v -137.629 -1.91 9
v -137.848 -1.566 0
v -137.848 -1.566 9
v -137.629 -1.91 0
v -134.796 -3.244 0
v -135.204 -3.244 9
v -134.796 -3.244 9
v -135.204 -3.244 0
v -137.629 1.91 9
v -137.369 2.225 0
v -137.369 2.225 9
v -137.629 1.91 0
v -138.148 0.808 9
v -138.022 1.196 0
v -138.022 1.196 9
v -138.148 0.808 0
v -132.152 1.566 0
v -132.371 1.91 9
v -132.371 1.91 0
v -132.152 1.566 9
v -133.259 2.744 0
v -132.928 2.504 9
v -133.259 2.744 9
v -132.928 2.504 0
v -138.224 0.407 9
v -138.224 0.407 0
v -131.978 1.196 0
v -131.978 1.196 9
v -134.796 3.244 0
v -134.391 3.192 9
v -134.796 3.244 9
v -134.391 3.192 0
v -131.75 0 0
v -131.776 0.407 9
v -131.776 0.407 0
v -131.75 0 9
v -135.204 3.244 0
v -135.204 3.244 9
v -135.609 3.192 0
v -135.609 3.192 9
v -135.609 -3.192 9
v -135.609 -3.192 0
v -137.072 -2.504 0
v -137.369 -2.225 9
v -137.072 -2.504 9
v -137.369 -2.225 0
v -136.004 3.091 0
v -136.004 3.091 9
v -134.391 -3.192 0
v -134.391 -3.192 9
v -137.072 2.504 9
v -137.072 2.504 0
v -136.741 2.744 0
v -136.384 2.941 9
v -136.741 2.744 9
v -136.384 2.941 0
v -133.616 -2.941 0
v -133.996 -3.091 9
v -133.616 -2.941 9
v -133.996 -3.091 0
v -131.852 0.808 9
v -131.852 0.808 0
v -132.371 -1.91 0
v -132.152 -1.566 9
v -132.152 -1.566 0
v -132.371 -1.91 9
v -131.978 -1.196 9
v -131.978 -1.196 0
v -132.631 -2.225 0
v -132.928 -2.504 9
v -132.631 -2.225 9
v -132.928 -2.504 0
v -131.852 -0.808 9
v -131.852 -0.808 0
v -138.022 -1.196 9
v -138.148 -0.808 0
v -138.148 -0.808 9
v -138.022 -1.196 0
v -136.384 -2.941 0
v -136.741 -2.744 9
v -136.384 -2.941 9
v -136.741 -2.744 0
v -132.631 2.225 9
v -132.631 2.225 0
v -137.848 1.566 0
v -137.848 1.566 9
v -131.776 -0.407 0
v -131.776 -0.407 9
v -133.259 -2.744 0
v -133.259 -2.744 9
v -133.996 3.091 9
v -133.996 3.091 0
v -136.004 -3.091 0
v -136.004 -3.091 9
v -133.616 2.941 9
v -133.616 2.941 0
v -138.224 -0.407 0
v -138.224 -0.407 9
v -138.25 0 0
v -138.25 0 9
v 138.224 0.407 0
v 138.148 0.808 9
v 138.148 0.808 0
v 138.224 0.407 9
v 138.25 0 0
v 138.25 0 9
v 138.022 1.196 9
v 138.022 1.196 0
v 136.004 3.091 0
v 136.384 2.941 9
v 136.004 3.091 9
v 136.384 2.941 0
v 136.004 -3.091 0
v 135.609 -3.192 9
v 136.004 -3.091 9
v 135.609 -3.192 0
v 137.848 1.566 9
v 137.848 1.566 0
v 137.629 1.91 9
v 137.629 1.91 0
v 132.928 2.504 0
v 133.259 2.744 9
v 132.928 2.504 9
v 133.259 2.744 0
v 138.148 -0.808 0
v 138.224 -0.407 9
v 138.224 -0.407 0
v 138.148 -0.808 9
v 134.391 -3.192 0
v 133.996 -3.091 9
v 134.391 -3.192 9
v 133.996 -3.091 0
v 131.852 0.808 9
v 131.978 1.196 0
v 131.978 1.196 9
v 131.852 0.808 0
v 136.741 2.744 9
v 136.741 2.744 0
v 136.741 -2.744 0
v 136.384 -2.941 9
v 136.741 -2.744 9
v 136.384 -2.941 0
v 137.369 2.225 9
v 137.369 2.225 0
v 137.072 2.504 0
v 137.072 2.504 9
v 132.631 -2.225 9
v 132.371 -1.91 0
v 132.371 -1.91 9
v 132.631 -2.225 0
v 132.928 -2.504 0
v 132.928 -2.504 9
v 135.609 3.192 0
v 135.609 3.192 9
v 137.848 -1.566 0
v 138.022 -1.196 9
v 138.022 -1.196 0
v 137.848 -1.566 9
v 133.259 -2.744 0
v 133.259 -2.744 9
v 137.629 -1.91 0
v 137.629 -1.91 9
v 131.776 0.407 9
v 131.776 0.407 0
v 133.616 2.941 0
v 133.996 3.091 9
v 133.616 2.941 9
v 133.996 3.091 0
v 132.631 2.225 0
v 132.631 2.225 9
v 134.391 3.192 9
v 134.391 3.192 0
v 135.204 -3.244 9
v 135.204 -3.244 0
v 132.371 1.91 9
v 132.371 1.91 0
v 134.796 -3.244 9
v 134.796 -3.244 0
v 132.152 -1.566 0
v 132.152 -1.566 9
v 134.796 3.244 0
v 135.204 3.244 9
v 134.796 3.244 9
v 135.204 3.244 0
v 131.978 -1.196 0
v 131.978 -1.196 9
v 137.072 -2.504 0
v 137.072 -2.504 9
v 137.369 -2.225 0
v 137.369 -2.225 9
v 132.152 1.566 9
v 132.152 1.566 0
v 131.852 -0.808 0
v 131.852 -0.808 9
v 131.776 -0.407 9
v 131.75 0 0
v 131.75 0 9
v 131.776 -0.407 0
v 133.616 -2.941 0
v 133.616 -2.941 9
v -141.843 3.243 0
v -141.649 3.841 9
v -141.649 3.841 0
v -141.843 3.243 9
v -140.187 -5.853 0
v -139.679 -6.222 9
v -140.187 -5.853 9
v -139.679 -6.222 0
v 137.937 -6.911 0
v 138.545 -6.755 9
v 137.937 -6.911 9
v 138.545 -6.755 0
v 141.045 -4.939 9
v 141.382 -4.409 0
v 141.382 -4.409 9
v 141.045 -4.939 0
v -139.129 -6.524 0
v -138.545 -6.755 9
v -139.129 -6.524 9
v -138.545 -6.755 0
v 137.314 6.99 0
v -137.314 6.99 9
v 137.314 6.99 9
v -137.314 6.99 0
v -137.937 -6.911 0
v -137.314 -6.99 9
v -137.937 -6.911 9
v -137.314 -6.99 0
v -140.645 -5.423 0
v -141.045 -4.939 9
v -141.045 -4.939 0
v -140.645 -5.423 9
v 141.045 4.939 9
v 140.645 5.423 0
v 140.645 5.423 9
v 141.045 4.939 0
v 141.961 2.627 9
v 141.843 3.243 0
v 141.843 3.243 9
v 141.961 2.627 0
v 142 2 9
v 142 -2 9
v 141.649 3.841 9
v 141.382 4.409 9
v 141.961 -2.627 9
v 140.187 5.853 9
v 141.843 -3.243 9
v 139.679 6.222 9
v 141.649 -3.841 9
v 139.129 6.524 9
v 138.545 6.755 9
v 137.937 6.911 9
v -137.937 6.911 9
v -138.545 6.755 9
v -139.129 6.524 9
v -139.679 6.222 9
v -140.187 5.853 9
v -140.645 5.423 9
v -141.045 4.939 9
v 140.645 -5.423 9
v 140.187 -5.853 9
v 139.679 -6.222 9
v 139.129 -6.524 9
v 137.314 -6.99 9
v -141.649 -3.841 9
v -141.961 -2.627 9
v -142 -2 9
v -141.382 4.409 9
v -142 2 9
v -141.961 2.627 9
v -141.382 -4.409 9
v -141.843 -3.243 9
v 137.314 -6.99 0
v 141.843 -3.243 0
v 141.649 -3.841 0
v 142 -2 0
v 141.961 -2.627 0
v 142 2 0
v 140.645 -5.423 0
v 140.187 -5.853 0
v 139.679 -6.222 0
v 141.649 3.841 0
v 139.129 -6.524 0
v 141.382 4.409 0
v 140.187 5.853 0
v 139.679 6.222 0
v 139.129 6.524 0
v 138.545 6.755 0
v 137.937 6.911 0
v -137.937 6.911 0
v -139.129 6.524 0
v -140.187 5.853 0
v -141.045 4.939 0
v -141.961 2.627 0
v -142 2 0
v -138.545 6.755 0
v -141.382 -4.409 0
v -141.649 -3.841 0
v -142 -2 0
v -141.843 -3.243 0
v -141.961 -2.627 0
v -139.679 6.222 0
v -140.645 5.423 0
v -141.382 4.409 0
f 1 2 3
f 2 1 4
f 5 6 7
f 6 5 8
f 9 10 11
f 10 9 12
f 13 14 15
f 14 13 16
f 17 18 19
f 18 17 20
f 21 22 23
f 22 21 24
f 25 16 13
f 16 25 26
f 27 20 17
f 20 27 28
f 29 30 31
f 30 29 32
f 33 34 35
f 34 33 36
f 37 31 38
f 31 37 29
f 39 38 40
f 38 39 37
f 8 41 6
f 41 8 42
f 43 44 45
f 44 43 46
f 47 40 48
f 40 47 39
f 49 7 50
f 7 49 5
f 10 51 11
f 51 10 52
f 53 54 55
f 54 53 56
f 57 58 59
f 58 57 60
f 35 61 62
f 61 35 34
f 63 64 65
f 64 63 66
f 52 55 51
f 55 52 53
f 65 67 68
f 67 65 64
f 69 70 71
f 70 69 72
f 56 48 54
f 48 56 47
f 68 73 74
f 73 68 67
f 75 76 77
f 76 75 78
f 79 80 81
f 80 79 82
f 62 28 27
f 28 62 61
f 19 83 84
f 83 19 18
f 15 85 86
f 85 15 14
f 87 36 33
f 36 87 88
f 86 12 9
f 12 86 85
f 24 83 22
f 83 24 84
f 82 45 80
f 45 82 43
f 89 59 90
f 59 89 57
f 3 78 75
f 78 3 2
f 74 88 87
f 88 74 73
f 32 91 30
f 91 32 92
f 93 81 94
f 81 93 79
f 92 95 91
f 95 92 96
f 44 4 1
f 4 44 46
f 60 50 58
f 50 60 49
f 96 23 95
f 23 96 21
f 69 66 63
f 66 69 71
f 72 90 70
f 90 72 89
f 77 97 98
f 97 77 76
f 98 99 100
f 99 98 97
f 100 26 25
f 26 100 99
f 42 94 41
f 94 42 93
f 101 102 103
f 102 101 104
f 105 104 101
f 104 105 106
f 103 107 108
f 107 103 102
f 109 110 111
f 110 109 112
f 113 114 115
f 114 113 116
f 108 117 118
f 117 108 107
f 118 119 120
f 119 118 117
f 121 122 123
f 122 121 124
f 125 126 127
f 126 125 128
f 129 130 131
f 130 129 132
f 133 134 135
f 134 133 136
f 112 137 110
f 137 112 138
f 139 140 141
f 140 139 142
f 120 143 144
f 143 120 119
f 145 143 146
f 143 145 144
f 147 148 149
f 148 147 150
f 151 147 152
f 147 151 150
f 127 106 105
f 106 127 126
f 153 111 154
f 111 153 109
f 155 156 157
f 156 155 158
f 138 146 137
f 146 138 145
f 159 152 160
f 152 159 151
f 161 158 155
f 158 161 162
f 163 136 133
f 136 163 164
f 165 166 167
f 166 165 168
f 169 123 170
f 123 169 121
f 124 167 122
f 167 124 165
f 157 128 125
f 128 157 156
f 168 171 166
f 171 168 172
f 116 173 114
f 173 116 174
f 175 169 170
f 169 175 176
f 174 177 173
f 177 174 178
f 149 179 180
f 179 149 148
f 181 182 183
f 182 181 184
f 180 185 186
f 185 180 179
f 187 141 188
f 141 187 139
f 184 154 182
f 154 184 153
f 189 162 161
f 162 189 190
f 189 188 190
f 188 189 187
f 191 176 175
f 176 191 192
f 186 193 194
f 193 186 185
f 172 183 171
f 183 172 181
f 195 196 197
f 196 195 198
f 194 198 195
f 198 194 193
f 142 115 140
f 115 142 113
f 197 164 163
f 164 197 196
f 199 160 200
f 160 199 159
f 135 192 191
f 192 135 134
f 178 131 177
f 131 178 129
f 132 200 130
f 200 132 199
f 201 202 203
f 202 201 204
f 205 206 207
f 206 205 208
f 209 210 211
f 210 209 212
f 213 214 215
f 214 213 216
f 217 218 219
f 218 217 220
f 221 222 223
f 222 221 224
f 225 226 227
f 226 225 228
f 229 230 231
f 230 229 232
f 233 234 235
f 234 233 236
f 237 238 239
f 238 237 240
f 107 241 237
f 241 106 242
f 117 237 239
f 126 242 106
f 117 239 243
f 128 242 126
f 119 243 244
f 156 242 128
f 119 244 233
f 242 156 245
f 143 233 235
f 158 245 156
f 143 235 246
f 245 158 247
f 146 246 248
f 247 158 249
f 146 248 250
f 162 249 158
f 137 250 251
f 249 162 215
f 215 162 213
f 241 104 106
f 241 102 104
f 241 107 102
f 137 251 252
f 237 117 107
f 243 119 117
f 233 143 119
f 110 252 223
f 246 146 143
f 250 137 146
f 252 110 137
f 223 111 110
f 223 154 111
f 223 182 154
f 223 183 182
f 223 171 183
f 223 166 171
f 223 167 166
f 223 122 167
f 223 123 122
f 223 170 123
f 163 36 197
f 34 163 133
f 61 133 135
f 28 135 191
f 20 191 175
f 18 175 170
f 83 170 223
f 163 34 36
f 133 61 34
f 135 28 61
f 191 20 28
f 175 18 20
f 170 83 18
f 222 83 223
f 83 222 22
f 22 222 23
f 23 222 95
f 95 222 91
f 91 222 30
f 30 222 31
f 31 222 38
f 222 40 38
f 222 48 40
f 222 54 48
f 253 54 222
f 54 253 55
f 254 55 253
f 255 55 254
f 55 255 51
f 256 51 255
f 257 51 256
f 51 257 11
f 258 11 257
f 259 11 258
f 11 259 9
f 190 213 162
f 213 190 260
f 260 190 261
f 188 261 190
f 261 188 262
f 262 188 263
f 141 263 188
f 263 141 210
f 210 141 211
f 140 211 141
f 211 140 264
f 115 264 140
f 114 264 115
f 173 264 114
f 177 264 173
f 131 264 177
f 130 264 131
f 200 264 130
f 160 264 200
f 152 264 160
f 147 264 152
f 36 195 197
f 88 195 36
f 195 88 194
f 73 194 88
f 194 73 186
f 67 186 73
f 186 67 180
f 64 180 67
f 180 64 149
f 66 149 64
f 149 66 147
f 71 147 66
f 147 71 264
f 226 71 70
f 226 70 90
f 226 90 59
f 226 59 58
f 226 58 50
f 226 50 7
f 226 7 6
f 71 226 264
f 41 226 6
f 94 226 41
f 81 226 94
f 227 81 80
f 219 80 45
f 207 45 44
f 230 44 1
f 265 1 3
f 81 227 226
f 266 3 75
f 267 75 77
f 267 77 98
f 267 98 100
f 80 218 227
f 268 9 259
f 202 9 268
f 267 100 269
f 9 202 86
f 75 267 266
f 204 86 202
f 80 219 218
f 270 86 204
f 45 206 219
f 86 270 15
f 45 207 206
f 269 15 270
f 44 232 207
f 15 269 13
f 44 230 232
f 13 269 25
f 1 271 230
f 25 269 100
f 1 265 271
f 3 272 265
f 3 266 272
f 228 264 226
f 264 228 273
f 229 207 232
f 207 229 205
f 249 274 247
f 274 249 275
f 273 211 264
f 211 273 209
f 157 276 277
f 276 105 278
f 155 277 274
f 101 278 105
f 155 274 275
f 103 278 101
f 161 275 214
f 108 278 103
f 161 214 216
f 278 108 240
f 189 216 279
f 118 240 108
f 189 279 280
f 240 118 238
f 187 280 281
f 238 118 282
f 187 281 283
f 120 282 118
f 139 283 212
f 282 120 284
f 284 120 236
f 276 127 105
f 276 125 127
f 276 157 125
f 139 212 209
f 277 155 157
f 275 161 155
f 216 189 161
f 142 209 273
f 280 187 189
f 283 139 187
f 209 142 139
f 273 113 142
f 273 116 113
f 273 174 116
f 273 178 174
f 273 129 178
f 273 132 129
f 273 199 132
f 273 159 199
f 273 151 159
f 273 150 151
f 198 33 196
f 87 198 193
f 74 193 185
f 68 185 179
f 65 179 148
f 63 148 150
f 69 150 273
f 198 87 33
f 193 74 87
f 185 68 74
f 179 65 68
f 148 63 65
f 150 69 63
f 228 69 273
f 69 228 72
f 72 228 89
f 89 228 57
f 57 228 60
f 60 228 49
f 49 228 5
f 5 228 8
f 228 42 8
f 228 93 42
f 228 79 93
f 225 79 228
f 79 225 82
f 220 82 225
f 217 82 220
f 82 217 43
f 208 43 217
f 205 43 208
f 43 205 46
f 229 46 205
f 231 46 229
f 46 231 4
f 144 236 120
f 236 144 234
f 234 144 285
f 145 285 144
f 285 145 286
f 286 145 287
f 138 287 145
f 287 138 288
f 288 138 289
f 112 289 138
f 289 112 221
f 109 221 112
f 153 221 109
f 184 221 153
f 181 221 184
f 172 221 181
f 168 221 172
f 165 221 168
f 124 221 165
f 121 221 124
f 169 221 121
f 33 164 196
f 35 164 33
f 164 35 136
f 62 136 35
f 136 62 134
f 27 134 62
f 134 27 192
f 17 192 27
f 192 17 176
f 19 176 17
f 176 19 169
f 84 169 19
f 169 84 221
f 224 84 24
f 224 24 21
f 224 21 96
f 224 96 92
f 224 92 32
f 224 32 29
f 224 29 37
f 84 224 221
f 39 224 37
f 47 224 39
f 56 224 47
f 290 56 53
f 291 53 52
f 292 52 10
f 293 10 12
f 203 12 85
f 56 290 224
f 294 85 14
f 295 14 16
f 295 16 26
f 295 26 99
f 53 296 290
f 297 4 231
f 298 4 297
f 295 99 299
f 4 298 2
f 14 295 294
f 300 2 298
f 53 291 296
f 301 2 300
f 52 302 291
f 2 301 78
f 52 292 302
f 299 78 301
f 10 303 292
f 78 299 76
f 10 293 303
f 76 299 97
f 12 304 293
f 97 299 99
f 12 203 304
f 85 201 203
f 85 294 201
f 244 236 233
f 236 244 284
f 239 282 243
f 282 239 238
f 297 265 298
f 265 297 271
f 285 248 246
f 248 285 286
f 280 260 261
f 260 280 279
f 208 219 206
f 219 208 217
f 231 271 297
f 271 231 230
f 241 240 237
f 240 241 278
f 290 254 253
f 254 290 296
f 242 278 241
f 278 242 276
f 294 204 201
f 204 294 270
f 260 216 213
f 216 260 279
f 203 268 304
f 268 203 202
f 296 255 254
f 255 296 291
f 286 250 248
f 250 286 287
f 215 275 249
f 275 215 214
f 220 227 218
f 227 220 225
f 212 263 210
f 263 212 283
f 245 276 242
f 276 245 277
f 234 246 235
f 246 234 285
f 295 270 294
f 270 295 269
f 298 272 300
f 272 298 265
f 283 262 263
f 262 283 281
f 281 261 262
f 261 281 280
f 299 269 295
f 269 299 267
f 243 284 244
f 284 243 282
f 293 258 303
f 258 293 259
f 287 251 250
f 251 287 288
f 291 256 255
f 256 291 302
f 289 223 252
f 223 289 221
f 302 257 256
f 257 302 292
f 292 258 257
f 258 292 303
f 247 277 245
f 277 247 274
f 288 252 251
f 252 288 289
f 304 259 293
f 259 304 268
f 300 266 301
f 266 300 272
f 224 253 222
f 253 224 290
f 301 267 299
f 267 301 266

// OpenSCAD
$fn = 50;


difference() {
	union() {
		hull() {
			translate(v = [-137.0000000000, 2.0000000000, 0]) {
				cylinder(h = 9, r = 5);
			}
			translate(v = [137.0000000000, 2.0000000000, 0]) {
				cylinder(h = 9, r = 5);
			}
			translate(v = [-137.0000000000, -2.0000000000, 0]) {
				cylinder(h = 9, r = 5);
			}
			translate(v = [137.0000000000, -2.0000000000, 0]) {
				cylinder(h = 9, r = 5);
			}
		}
	}
	union() {
		translate(v = [-135.0000000000, 0.0000000000, -100.0000000000]) {
			cylinder(h = 200, r = 3.2500000000);
		}
		translate(v = [-135.0000000000, 0.0000000000, -100.0000000000]) {
			cylinder(h = 200, r = 3.2500000000);
		}
		translate(v = [135.0000000000, 0.0000000000, -100.0000000000]) {
			cylinder(h = 200, r = 3.2500000000);
		}
		translate(v = [135.0000000000, 0.0000000000, -100.0000000000]) {
			cylinder(h = 200, r = 3.2500000000);
		}
	}
}
